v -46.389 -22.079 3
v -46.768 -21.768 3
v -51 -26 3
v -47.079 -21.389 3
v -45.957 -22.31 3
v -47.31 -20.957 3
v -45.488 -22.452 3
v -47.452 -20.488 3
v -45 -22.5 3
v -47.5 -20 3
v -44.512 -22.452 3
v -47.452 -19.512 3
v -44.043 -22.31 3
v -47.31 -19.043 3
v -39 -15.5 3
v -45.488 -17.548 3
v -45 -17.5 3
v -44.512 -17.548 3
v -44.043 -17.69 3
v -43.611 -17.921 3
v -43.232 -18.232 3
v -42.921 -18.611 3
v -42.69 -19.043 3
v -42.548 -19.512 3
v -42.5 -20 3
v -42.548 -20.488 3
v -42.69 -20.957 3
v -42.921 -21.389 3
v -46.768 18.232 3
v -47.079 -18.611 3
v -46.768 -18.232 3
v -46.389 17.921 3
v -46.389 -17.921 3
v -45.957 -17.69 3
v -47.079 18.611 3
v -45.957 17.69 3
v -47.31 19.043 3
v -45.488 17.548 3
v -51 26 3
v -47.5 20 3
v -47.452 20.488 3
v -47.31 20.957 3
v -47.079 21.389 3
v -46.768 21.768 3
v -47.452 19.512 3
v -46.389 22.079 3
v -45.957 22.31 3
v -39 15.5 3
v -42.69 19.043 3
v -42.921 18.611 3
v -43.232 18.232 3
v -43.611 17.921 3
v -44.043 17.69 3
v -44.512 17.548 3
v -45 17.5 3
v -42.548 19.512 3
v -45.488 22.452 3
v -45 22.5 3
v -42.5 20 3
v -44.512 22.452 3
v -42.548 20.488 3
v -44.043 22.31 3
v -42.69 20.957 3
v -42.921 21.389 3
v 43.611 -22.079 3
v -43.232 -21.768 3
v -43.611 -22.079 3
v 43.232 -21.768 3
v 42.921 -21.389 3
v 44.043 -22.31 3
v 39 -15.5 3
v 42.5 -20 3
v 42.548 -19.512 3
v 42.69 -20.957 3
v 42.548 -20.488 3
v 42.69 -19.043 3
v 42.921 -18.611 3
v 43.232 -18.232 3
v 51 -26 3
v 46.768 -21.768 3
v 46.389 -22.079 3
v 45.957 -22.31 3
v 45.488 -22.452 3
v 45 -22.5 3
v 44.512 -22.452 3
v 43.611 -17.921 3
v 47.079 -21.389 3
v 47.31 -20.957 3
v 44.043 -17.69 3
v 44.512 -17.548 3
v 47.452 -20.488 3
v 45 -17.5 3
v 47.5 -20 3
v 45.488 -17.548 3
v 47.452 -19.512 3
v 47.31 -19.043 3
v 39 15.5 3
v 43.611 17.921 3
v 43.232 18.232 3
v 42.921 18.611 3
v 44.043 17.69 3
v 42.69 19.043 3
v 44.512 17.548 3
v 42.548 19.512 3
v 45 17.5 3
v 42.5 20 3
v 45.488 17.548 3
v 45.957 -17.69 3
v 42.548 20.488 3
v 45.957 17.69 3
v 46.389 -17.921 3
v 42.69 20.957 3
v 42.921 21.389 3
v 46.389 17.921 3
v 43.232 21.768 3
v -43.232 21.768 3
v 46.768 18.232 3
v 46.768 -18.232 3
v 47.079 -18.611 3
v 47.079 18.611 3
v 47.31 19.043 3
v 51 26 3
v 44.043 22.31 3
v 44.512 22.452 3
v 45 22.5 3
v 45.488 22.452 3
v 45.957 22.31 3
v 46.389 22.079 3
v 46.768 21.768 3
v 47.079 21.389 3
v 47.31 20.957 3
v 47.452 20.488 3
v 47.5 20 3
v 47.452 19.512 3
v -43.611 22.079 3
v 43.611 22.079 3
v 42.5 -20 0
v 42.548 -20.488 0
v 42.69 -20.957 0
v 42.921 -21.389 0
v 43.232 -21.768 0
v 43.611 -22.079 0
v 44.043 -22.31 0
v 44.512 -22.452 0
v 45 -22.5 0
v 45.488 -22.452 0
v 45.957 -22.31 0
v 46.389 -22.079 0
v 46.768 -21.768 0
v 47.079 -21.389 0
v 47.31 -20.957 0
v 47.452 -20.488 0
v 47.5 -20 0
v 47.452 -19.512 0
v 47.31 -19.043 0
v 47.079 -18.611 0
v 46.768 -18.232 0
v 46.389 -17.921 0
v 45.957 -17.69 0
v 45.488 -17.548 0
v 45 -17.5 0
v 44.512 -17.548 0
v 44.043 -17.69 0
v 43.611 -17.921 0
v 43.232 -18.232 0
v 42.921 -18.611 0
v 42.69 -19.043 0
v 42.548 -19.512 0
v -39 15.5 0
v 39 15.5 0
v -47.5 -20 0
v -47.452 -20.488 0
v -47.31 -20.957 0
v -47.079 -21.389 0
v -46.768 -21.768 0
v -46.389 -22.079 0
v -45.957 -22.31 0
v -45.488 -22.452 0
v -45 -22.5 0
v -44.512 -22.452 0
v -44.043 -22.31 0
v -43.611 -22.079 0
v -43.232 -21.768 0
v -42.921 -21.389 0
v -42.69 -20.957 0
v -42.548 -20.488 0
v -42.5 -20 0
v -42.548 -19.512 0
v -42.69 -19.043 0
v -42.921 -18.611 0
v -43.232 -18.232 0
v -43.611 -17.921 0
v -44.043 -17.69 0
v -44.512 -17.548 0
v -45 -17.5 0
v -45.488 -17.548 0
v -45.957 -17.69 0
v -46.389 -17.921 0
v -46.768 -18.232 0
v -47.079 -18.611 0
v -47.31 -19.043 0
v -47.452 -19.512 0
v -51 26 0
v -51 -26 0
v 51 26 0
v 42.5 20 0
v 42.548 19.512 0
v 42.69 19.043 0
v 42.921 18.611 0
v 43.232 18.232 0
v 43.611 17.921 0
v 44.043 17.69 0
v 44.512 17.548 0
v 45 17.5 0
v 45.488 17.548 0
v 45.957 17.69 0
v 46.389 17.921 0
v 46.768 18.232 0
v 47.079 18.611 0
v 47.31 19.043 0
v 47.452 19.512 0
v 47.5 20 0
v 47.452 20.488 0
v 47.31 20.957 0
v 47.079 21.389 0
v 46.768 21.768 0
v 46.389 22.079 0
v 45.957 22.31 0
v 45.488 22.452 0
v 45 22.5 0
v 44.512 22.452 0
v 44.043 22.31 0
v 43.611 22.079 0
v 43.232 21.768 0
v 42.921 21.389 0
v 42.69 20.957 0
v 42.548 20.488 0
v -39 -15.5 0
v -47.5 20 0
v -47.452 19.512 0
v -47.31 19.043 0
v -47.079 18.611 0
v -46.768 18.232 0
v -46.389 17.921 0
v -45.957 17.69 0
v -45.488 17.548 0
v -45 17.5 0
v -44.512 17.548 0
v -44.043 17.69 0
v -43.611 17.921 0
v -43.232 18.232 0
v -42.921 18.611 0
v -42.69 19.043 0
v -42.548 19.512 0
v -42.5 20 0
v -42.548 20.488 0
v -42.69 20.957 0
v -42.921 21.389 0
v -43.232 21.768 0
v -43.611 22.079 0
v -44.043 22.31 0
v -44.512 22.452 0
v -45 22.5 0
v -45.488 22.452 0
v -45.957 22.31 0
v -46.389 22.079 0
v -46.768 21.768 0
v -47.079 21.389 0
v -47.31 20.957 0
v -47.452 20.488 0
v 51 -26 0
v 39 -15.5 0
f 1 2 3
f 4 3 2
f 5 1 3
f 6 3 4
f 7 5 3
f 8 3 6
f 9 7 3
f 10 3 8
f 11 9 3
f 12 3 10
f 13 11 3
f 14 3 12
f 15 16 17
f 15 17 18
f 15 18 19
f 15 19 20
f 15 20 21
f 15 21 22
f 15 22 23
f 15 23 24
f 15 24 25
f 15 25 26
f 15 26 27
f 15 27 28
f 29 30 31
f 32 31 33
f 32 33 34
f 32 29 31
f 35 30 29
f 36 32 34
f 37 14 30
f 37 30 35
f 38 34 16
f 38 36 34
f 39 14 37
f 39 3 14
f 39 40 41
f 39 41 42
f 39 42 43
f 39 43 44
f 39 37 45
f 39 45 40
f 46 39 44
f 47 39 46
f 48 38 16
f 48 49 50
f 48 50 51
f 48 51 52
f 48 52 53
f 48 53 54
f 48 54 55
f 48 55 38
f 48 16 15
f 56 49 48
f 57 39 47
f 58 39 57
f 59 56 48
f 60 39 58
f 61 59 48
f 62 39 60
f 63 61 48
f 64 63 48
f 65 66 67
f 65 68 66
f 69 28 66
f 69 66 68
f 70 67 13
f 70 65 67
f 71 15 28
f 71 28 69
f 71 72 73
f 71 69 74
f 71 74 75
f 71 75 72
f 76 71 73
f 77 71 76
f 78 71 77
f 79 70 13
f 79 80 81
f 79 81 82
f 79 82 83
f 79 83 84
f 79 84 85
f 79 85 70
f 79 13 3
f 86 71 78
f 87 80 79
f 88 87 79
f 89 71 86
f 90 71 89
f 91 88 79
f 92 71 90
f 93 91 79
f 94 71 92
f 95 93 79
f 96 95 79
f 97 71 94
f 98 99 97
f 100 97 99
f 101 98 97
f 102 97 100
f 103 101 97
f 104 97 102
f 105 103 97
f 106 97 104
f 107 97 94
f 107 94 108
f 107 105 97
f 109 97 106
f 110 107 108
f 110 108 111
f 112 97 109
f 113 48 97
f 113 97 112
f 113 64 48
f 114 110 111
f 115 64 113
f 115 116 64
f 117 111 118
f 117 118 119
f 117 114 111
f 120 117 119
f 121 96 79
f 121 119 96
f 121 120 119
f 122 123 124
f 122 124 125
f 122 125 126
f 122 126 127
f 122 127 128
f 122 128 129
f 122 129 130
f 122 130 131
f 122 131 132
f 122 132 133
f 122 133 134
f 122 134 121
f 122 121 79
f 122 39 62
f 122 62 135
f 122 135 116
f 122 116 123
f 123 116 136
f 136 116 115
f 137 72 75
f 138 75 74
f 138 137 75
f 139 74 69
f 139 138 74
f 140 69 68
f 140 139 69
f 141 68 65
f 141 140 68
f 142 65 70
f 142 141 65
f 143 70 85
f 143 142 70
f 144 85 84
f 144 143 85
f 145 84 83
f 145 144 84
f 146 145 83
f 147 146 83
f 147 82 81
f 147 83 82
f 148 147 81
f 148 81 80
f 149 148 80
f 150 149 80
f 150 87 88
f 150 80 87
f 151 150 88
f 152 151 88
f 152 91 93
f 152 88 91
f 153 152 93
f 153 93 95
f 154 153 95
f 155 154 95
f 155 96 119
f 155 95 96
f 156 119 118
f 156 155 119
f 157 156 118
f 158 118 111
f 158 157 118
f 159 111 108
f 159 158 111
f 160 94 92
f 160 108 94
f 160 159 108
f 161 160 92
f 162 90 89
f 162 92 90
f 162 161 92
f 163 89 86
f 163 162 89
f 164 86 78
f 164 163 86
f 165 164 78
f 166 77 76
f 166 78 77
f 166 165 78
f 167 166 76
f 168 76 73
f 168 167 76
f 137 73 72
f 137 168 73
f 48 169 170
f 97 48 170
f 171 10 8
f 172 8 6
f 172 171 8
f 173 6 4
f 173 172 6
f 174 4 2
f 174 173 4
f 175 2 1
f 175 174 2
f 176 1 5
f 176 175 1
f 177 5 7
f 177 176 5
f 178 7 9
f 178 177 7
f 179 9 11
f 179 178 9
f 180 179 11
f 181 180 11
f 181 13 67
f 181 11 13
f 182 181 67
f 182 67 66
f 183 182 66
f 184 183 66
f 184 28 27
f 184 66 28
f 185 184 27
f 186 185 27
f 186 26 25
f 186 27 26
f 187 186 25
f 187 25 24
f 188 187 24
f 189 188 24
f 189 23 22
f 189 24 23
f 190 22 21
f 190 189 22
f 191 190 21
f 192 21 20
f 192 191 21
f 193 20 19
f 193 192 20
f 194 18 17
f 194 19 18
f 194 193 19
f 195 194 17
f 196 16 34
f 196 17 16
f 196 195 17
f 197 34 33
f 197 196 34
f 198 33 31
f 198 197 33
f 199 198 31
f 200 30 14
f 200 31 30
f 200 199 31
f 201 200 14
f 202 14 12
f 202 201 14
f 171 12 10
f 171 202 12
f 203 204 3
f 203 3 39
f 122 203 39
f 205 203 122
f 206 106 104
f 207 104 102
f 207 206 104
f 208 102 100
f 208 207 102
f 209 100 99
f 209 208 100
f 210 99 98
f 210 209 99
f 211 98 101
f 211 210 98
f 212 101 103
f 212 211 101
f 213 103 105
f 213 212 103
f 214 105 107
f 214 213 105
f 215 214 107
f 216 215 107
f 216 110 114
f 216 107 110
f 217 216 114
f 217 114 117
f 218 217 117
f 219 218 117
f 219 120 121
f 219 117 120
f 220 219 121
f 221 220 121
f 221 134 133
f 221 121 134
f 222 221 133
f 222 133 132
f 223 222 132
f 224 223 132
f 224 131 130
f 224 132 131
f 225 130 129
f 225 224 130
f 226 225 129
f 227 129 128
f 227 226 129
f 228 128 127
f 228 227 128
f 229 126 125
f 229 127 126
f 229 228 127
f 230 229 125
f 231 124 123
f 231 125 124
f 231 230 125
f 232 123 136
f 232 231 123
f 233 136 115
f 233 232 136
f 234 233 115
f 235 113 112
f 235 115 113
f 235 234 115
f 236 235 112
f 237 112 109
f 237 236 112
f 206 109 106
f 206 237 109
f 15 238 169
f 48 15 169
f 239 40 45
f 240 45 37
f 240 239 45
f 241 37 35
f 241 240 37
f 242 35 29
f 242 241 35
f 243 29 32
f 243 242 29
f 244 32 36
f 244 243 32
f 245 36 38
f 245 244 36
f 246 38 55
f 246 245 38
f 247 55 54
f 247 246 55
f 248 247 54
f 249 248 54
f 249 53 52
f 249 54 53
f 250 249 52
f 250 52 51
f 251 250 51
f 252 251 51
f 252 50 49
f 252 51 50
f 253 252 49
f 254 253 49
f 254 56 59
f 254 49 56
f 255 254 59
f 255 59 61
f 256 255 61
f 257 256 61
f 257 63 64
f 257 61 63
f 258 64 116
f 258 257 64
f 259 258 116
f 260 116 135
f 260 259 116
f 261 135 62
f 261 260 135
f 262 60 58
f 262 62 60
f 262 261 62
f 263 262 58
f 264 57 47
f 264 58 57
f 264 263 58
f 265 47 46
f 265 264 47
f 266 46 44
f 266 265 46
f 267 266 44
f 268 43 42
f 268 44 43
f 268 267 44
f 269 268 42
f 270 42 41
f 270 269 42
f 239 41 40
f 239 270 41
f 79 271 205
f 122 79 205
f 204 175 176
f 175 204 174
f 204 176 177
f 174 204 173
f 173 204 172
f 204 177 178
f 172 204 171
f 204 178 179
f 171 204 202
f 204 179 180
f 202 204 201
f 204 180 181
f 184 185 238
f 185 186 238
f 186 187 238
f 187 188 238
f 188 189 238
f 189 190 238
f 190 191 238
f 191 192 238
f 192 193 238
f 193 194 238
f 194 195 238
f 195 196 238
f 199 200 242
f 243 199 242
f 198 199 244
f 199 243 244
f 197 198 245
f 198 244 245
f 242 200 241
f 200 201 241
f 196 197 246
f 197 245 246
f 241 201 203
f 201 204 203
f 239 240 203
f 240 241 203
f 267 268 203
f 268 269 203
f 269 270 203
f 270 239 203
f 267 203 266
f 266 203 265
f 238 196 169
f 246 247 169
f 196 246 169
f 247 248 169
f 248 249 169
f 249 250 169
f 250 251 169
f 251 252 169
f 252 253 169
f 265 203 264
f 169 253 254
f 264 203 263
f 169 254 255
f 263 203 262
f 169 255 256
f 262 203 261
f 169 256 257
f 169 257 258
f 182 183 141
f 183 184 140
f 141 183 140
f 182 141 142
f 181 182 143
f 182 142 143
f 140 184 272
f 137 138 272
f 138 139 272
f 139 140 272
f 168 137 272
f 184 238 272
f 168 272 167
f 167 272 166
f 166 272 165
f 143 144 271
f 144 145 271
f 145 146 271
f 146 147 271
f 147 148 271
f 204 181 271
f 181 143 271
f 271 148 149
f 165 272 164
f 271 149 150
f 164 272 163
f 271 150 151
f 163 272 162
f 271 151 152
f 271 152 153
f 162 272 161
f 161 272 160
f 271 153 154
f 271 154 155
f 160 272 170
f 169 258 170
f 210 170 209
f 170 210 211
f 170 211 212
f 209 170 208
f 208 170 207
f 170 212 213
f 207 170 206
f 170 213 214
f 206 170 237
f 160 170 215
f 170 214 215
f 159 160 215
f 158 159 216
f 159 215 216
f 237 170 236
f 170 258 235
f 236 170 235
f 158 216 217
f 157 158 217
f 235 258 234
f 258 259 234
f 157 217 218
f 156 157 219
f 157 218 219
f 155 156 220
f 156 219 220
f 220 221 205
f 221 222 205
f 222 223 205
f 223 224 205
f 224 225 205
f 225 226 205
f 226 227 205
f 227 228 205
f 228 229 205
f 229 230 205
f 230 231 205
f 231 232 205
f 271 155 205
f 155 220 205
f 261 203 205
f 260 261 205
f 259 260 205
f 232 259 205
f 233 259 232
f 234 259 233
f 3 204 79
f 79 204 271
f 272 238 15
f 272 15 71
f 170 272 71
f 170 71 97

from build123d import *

# Parameters (mm, degrees)
SKETCH1_W           = 102
SKETCH1_H           = 52
SKETCH1_W_2         = 78
SKETCH1_H_2         = 31
BOSS_EXTRUDE1_DEPTH = 3
SKETCH2_R           = 2.5
CUT_EXTRUDE6_DEPTH  = 31


with BuildPart() as part:
    # Sketch1 → Boss-Extrude1 (new body)
    with BuildSketch(Plane.XY):
        Rectangle(SKETCH1_W, SKETCH1_H)
        Rectangle(SKETCH1_W_2, SKETCH1_H_2, mode=Mode.SUBTRACT)
    extrude(amount=BOSS_EXTRUDE1_DEPTH)

    # Sketch2 → Cut-Extrude6 (cut)
    with BuildSketch(Plane.XY):
        with Locations(Location((-45, 20, 0), (0, 0, 180))):
            Circle(SKETCH2_R)
        with Locations(Location((-45, -20, 0), (0, 0, 180))):
            Circle(SKETCH2_R)
        with Locations(Location((45, -20, 0), (0, 0, 180))):
            Circle(SKETCH2_R)
        with Locations(Location((45, 20, 0), (0, 0, 180))):
            Circle(SKETCH2_R)
    extrude(amount=CUT_EXTRUDE6_DEPTH, mode=Mode.SUBTRACT)


solid = part.part
